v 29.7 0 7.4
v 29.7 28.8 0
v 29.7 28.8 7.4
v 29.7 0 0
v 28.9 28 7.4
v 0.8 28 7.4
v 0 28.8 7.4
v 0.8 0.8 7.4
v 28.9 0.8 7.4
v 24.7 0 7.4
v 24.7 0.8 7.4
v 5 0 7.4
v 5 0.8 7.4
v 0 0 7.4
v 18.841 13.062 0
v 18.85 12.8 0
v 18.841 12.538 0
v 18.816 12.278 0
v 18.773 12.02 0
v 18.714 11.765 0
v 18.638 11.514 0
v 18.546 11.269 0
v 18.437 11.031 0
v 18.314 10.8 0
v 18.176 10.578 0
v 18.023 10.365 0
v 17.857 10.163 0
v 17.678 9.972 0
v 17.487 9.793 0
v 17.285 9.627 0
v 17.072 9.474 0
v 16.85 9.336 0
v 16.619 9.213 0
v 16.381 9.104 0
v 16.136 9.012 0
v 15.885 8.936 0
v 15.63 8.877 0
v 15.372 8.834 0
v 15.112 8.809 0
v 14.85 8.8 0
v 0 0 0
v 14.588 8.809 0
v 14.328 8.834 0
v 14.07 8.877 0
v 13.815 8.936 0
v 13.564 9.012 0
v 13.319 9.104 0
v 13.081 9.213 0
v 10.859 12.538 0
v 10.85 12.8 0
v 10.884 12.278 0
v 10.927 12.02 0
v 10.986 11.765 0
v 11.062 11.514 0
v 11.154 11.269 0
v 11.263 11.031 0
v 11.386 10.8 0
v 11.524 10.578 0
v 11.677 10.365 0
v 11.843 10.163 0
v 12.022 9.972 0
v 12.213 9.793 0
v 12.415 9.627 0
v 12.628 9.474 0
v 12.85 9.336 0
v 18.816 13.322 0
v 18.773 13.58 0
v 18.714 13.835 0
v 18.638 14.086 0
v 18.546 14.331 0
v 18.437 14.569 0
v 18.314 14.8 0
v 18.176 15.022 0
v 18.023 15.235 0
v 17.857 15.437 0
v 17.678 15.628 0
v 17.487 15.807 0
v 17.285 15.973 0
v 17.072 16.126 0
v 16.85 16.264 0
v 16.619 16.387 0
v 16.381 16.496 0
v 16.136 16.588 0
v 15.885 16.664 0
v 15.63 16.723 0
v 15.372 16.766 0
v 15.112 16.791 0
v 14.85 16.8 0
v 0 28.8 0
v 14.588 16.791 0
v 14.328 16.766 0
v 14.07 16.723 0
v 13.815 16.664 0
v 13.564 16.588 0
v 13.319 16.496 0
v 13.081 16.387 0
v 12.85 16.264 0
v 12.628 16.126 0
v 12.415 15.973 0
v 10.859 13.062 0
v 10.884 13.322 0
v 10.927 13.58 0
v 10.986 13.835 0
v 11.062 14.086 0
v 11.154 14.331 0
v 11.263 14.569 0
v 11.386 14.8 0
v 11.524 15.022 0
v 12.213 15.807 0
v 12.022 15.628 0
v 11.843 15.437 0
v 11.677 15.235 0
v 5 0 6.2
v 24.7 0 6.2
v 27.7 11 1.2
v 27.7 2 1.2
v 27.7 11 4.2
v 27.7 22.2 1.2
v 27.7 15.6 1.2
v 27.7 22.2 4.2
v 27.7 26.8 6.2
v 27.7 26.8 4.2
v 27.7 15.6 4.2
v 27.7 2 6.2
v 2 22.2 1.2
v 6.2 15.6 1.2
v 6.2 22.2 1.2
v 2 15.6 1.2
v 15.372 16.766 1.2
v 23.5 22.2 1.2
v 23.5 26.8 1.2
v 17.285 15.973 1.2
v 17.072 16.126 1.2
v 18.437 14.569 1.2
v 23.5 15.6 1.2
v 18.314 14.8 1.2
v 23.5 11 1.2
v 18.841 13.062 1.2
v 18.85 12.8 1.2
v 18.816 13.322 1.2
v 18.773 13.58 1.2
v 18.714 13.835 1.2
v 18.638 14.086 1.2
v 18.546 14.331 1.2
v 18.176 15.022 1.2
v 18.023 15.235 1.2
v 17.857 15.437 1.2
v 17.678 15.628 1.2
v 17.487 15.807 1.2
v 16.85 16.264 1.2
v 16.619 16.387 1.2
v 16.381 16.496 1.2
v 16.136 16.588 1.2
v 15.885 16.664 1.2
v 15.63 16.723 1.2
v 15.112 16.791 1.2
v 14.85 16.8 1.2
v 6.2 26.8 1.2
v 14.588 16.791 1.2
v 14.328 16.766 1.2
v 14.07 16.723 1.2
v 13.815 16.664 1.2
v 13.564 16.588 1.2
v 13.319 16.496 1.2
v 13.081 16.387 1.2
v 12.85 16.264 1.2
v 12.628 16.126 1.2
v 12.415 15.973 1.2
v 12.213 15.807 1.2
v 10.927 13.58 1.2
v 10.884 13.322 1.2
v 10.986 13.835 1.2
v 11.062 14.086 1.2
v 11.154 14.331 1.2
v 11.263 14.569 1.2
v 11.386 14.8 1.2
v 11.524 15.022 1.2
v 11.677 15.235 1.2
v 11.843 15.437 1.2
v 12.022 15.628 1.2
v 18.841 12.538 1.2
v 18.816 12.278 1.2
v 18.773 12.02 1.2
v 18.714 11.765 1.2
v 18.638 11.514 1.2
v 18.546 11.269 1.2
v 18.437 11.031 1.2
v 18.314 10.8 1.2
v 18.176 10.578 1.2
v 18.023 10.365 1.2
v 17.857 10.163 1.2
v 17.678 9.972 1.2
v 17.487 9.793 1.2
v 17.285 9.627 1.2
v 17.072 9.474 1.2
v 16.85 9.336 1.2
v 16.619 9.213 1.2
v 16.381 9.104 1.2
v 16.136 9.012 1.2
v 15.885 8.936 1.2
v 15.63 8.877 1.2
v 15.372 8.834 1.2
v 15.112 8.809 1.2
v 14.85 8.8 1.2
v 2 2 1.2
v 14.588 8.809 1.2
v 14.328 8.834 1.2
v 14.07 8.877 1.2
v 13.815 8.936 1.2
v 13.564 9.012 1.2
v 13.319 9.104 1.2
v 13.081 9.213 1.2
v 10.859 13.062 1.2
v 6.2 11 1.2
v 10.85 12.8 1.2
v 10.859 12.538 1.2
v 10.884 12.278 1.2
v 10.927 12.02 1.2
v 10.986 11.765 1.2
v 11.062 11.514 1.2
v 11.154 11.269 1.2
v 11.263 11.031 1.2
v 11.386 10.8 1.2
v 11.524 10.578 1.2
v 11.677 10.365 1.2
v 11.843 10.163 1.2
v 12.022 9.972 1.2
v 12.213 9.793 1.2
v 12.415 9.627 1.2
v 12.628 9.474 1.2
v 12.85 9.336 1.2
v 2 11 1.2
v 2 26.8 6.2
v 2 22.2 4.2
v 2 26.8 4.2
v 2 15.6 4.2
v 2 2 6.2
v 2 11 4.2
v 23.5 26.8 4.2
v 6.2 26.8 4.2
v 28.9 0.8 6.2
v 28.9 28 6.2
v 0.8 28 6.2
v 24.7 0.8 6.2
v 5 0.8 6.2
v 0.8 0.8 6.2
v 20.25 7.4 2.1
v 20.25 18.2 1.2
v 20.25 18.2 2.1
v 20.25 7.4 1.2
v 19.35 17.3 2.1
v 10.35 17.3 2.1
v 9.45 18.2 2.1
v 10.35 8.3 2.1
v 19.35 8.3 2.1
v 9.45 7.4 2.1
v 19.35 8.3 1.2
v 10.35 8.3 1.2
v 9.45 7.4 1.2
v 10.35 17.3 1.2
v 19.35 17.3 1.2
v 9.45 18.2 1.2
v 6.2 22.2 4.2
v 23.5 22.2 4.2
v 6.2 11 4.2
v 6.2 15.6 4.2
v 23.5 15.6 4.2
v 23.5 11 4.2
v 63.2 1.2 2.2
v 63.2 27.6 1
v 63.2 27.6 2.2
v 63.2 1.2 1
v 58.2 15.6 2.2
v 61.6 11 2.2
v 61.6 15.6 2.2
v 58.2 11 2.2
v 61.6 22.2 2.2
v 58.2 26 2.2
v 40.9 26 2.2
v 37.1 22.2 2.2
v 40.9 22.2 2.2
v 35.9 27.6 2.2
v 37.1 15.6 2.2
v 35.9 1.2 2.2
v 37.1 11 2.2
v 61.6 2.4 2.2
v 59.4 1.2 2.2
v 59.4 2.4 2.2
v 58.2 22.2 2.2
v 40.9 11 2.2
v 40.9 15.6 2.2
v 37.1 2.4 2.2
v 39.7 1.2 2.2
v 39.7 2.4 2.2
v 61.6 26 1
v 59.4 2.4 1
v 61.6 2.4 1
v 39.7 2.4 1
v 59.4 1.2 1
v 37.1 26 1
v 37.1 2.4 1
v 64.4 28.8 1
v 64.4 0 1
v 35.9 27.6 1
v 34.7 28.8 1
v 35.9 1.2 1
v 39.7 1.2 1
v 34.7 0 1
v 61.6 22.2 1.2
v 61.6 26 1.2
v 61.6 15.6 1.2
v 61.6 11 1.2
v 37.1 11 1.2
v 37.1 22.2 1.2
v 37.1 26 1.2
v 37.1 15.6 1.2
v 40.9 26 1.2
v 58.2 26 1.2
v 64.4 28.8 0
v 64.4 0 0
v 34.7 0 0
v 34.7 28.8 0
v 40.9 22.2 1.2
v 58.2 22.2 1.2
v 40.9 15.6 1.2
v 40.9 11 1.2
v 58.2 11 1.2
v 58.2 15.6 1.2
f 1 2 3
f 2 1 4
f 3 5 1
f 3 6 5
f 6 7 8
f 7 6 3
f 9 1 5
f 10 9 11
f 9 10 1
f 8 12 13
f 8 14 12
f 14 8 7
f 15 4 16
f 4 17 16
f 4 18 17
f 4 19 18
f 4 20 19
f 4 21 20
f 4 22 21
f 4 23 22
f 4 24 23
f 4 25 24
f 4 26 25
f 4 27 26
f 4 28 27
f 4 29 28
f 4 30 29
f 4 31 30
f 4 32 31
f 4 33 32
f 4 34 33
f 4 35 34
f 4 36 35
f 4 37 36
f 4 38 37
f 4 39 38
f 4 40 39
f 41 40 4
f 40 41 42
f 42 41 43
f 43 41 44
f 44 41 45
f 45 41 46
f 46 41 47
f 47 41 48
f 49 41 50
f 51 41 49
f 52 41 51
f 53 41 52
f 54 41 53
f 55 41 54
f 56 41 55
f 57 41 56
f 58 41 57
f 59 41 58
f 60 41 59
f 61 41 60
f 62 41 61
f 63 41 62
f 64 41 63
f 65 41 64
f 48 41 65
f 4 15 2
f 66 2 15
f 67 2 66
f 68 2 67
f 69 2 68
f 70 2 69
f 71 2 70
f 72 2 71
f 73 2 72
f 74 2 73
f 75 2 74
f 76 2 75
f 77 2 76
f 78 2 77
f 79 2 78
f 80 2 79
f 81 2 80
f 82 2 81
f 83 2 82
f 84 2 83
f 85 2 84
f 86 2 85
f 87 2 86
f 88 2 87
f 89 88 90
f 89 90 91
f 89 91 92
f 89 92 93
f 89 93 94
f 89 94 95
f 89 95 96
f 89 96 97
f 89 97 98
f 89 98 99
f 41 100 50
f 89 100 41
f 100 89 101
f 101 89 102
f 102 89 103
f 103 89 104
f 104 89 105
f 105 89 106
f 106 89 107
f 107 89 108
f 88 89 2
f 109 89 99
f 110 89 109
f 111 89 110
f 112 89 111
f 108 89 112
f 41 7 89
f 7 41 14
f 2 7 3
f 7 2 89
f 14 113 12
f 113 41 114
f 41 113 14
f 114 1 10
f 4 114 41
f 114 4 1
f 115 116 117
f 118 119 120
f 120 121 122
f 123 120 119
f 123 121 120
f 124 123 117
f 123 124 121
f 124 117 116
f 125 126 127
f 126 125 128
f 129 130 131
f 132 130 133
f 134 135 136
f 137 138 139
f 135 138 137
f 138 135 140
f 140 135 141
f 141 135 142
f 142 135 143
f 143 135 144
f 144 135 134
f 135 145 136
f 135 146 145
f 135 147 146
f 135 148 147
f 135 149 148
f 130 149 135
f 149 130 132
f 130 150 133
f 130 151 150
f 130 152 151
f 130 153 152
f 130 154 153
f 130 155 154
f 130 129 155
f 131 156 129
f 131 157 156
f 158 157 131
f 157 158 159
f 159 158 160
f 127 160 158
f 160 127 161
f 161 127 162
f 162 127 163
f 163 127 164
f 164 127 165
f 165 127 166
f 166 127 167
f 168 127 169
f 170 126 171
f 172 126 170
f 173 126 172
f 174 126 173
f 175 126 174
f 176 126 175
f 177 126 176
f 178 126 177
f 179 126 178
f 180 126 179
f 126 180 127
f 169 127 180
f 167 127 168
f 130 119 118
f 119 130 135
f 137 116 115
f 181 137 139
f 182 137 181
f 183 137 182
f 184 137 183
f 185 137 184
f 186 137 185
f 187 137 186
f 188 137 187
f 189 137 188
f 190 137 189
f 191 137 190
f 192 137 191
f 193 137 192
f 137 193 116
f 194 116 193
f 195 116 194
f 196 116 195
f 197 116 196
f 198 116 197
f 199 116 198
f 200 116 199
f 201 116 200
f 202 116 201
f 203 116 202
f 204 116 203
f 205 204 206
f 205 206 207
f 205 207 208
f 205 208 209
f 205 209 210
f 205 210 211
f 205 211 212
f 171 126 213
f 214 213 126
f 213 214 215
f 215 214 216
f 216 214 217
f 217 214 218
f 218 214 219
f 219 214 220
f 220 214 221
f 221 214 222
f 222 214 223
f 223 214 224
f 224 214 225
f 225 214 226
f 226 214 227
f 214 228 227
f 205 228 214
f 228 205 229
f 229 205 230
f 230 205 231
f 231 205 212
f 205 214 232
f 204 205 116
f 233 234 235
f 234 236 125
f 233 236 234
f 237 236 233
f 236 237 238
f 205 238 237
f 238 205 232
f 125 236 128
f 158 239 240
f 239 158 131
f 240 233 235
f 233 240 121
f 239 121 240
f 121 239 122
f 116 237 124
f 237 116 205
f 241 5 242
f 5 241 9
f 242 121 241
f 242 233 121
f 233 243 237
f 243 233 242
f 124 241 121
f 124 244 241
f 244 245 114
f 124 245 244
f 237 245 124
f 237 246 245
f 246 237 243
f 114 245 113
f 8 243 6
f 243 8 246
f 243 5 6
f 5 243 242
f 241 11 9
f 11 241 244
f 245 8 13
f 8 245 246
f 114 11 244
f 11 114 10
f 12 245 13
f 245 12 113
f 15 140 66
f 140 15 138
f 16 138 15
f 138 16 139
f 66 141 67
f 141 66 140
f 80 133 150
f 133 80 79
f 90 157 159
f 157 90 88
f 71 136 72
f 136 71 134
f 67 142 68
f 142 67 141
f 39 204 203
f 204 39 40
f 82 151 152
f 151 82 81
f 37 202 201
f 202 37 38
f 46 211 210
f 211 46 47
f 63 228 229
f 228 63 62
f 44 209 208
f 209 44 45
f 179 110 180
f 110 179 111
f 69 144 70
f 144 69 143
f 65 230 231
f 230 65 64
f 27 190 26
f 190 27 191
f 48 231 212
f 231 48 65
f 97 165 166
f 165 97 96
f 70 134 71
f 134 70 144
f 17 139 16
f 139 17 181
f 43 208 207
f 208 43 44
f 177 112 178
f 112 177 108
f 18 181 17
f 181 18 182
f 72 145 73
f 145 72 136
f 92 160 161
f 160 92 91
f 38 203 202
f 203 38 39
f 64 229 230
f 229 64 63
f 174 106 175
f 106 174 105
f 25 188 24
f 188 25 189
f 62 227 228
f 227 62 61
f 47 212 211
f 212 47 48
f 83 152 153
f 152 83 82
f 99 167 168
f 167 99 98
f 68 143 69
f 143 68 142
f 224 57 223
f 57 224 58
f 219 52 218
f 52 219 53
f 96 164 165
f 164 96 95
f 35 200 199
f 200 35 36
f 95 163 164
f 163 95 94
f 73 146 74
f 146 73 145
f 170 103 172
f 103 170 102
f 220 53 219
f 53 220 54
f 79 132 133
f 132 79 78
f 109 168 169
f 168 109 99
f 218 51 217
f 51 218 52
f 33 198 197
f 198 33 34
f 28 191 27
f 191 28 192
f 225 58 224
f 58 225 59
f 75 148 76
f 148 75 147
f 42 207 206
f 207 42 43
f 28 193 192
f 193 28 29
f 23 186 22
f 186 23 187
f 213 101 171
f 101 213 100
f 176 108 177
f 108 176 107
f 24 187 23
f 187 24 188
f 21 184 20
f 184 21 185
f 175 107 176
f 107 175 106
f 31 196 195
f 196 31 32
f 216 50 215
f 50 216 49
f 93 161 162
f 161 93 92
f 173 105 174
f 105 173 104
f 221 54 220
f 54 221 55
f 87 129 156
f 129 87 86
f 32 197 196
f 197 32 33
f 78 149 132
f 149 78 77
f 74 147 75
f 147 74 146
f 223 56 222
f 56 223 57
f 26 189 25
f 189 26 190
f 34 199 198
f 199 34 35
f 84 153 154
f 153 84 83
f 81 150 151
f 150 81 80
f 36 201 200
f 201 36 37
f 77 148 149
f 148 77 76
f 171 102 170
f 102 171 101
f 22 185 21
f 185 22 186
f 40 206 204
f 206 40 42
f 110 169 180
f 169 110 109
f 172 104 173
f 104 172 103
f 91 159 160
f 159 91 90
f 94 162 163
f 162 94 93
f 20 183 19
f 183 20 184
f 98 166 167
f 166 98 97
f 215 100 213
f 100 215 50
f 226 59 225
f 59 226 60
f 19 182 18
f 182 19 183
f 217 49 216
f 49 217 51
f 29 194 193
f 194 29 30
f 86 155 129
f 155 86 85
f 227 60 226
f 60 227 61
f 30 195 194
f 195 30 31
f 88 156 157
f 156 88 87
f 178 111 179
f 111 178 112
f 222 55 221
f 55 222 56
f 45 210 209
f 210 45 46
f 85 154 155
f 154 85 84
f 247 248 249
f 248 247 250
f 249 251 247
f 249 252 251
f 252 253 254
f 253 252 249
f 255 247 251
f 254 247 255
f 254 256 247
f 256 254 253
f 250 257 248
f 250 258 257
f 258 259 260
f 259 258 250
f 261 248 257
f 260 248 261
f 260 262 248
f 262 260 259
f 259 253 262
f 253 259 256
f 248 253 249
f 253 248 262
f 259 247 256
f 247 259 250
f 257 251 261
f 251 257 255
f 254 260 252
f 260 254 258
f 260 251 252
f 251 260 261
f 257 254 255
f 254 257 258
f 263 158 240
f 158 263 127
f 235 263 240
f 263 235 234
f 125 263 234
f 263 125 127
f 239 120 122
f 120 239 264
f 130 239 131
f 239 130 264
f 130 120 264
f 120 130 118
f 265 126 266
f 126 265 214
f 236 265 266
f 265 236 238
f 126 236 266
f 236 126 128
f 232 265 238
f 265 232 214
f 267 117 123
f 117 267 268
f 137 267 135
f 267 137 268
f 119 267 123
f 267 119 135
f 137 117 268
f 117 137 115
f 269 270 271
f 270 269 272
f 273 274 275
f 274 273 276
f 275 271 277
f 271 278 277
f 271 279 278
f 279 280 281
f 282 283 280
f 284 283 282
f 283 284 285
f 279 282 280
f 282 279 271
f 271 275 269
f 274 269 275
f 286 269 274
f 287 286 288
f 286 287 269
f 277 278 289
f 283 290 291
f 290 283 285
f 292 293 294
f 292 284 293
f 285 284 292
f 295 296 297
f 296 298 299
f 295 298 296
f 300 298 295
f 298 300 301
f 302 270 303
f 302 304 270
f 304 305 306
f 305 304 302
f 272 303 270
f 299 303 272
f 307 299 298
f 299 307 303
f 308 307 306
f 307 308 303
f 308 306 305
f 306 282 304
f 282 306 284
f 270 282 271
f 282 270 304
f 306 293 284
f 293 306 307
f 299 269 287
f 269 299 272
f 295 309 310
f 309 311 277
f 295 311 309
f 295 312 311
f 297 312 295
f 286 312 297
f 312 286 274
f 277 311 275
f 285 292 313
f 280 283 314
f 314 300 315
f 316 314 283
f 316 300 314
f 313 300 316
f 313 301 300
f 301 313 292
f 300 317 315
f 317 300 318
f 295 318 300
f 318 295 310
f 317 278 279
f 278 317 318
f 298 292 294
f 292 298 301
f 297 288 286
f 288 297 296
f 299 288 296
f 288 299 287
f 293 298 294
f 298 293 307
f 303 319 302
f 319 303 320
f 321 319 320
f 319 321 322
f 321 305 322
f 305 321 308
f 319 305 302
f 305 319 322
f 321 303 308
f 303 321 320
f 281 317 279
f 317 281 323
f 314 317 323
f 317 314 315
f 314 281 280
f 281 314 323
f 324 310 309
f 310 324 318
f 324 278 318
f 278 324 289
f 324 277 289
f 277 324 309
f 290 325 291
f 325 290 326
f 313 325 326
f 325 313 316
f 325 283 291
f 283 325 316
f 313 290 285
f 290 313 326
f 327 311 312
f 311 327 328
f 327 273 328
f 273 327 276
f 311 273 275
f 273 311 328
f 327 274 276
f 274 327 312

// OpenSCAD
///////////////
// Variables //
///////////////

clearance = 0.4;

// wall width
wall_width = 2;

// Camera module x
module_x = 24.9;

// Camera module y
module_y = 24;

// Camera module y
module_z = 7.8;

// Inner depth
shell_width = 1.2;

// Lip thickness
lip_width = 1.2;

// Lip height
lip_height = 1.2;

// Ribbon cable slot offset
ribbon_offset_x = 5;

// Ribbon cable slot height
ribbon_z = 1.2;

// Hole diameter for the lens
lens_diameter = 8;

// Move lens hole a little bit off the middle
lens_y_offset = 1.6;

// Borders for the lense module
lens_cube = 9;

// Border thickness for the lens module
lens_cube_wall = 0.9;

// Module spacer x
module_stand_x = 4.2;

// Module spacer y
module_stand_y = 4.6;

// Module spacer z
module_stand_z = 3;

// Move two spacers to the middle
module_stand_offset = 9;

// Lid thickness
lid_height = 1;


///////////////////////
// Calculated values //
///////////////////////

case_top_x = module_x+2*wall_width+2*clearance;
case_top_y = module_y+2*wall_width+2*clearance;
case_top_z = module_z - clearance;

////////////////
// Draw parts //
////////////////

case_top();
translate([case_top_x+5, 0, 0]) {
    lid();
}

/////////////
// Modules //
/////////////

module case_top() {
    
    difference() {
        
        // Outer cube
        cube ([case_top_x, case_top_y, case_top_z]);
        
        // Inner cube
        inner_cube_x = case_top_x - 2*wall_width;
        inner_cube_y = case_top_y - 2*wall_width;
        inner_cube_z = case_top_z-shell_width+clearance;
        
        translate([wall_width, wall_width, shell_width]) {
            cube ([inner_cube_x, inner_cube_y, inner_cube_z]);
        }

        // Lip cube
        lip_cube_x = case_top_x - 2*(wall_width-lip_width);
        lip_cube_y = case_top_y - 2*(wall_width-lip_width);
        lip_cube_z = case_top_z-shell_width+clearance;

        translate([wall_width-lip_width, wall_width-lip_width, case_top_z-lip_height]) {
            cube ([lip_cube_x, lip_cube_y, lip_cube_z]);
        }

        // Ribbon cut
        ribbon_cube_x = case_top_x - 2*ribbon_offset_x;
        ribbon_cube_y = wall_width+2*clearance;
        ribbon_cube_z = ribbon_z+clearance;

        translate([ribbon_offset_x, -clearance, case_top_z - ribbon_z]) {
            cube ([ribbon_cube_x, ribbon_cube_y, ribbon_cube_z]);
        }
        
        // Lens
        translate([case_top_x/2, case_top_y/2-lens_y_offset, -clearance]) {
            cylinder (d=lens_diameter, h=shell_width+2*clearance, $fn=96);
        }
    }

    // Module stand
    translate([wall_width, case_top_y-wall_width-module_stand_y, shell_width]) {
        cube ([module_stand_x, module_stand_y, module_stand_z]);
    }
    translate([case_top_x-wall_width-module_stand_x, case_top_y-wall_width-module_stand_y, shell_width]) {
        cube ([module_stand_x, module_stand_y, module_stand_z]);
    }
    translate([wall_width, wall_width+module_stand_offset, shell_width]) {
        cube ([module_stand_x, module_stand_y, module_stand_z]);
    }
    translate([case_top_x-wall_width-module_stand_x, wall_width+module_stand_offset, shell_width]) {
        cube ([module_stand_x, module_stand_y, module_stand_z]);
    }

    // Lense cube
    translate_x = case_top_x/2 - lens_cube/2 - lens_cube_wall;
    translate_y = case_top_y/2 - lens_cube/2 - lens_cube_wall - lens_y_offset;

    translate([translate_x, translate_y, shell_width]) {
        difference() {
            cube ([lens_cube+2*lens_cube_wall, lens_cube+2*lens_cube_wall, lens_cube_wall]);
            translate([lens_cube_wall,lens_cube_wall,0]) {
                cube ([lens_cube, lens_cube, lens_cube_wall+clearance]);
            }
            translate([lens_cube/2+lens_cube_wall, lens_cube/2+lens_cube_wall, -clearance]) {
            cylinder (d=lens_diameter, h=shell_width+2*clearance, $fn=96);
        }

        }
    }
}

module lid() {
    
    cube([case_top_x, case_top_y, lid_height]);

    translate([
        wall_width-lip_width+clearance,
        wall_width-lip_width+clearance,
        lid_height]) {

        outer_lip_cube_x = case_top_x-2*wall_width+lip_width+clearance;
        outer_lip_cube_y = case_top_y-2*wall_width+lip_width+clearance;
        outer_lip_cube_z = lip_height;

        inner_lip_cube_x = case_top_x-2*wall_width-lip_width;
        inner_lip_cube_y = case_top_y-2*wall_width-lip_width;
        inner_lip_cube_z = lip_height + 2*clearance;

        difference() {
            
            // Lip cubes
            cube([outer_lip_cube_x, outer_lip_cube_y, outer_lip_cube_z]);
            translate([lip_width, lip_width, -clearance]) {
                cube([inner_lip_cube_x, inner_lip_cube_y, inner_lip_cube_z]);
            }
            
            // Ribbon cut
            ribbon_cube_x = case_top_x - 2*ribbon_offset_x;
            ribbon_cube_y = wall_width+2*clearance;
            ribbon_cube_z = ribbon_z+clearance;

            translate([ribbon_offset_x-(wall_width-lip_width+clearance), -clearance, 0]) {
                cube ([ribbon_cube_x, ribbon_cube_y, ribbon_cube_z]);
            }
        }
    }
    // Module stand
    translate([wall_width, case_top_y-wall_width-module_stand_y, shell_width]) {
        cube ([module_stand_x, module_stand_y, lid_height]);
    }
    translate([case_top_x-wall_width-module_stand_x, case_top_y-wall_width-module_stand_y, shell_width]) {
        cube ([module_stand_x, module_stand_y, lid_height]);
    }
    translate([wall_width, wall_width+module_stand_offset, shell_width]) {
        cube ([module_stand_x, module_stand_y, lid_height]);
    }
    translate([case_top_x-wall_width-module_stand_x, wall_width+module_stand_offset, shell_width]) {
        cube ([module_stand_x, module_stand_y, lid_height]);
    }
}
